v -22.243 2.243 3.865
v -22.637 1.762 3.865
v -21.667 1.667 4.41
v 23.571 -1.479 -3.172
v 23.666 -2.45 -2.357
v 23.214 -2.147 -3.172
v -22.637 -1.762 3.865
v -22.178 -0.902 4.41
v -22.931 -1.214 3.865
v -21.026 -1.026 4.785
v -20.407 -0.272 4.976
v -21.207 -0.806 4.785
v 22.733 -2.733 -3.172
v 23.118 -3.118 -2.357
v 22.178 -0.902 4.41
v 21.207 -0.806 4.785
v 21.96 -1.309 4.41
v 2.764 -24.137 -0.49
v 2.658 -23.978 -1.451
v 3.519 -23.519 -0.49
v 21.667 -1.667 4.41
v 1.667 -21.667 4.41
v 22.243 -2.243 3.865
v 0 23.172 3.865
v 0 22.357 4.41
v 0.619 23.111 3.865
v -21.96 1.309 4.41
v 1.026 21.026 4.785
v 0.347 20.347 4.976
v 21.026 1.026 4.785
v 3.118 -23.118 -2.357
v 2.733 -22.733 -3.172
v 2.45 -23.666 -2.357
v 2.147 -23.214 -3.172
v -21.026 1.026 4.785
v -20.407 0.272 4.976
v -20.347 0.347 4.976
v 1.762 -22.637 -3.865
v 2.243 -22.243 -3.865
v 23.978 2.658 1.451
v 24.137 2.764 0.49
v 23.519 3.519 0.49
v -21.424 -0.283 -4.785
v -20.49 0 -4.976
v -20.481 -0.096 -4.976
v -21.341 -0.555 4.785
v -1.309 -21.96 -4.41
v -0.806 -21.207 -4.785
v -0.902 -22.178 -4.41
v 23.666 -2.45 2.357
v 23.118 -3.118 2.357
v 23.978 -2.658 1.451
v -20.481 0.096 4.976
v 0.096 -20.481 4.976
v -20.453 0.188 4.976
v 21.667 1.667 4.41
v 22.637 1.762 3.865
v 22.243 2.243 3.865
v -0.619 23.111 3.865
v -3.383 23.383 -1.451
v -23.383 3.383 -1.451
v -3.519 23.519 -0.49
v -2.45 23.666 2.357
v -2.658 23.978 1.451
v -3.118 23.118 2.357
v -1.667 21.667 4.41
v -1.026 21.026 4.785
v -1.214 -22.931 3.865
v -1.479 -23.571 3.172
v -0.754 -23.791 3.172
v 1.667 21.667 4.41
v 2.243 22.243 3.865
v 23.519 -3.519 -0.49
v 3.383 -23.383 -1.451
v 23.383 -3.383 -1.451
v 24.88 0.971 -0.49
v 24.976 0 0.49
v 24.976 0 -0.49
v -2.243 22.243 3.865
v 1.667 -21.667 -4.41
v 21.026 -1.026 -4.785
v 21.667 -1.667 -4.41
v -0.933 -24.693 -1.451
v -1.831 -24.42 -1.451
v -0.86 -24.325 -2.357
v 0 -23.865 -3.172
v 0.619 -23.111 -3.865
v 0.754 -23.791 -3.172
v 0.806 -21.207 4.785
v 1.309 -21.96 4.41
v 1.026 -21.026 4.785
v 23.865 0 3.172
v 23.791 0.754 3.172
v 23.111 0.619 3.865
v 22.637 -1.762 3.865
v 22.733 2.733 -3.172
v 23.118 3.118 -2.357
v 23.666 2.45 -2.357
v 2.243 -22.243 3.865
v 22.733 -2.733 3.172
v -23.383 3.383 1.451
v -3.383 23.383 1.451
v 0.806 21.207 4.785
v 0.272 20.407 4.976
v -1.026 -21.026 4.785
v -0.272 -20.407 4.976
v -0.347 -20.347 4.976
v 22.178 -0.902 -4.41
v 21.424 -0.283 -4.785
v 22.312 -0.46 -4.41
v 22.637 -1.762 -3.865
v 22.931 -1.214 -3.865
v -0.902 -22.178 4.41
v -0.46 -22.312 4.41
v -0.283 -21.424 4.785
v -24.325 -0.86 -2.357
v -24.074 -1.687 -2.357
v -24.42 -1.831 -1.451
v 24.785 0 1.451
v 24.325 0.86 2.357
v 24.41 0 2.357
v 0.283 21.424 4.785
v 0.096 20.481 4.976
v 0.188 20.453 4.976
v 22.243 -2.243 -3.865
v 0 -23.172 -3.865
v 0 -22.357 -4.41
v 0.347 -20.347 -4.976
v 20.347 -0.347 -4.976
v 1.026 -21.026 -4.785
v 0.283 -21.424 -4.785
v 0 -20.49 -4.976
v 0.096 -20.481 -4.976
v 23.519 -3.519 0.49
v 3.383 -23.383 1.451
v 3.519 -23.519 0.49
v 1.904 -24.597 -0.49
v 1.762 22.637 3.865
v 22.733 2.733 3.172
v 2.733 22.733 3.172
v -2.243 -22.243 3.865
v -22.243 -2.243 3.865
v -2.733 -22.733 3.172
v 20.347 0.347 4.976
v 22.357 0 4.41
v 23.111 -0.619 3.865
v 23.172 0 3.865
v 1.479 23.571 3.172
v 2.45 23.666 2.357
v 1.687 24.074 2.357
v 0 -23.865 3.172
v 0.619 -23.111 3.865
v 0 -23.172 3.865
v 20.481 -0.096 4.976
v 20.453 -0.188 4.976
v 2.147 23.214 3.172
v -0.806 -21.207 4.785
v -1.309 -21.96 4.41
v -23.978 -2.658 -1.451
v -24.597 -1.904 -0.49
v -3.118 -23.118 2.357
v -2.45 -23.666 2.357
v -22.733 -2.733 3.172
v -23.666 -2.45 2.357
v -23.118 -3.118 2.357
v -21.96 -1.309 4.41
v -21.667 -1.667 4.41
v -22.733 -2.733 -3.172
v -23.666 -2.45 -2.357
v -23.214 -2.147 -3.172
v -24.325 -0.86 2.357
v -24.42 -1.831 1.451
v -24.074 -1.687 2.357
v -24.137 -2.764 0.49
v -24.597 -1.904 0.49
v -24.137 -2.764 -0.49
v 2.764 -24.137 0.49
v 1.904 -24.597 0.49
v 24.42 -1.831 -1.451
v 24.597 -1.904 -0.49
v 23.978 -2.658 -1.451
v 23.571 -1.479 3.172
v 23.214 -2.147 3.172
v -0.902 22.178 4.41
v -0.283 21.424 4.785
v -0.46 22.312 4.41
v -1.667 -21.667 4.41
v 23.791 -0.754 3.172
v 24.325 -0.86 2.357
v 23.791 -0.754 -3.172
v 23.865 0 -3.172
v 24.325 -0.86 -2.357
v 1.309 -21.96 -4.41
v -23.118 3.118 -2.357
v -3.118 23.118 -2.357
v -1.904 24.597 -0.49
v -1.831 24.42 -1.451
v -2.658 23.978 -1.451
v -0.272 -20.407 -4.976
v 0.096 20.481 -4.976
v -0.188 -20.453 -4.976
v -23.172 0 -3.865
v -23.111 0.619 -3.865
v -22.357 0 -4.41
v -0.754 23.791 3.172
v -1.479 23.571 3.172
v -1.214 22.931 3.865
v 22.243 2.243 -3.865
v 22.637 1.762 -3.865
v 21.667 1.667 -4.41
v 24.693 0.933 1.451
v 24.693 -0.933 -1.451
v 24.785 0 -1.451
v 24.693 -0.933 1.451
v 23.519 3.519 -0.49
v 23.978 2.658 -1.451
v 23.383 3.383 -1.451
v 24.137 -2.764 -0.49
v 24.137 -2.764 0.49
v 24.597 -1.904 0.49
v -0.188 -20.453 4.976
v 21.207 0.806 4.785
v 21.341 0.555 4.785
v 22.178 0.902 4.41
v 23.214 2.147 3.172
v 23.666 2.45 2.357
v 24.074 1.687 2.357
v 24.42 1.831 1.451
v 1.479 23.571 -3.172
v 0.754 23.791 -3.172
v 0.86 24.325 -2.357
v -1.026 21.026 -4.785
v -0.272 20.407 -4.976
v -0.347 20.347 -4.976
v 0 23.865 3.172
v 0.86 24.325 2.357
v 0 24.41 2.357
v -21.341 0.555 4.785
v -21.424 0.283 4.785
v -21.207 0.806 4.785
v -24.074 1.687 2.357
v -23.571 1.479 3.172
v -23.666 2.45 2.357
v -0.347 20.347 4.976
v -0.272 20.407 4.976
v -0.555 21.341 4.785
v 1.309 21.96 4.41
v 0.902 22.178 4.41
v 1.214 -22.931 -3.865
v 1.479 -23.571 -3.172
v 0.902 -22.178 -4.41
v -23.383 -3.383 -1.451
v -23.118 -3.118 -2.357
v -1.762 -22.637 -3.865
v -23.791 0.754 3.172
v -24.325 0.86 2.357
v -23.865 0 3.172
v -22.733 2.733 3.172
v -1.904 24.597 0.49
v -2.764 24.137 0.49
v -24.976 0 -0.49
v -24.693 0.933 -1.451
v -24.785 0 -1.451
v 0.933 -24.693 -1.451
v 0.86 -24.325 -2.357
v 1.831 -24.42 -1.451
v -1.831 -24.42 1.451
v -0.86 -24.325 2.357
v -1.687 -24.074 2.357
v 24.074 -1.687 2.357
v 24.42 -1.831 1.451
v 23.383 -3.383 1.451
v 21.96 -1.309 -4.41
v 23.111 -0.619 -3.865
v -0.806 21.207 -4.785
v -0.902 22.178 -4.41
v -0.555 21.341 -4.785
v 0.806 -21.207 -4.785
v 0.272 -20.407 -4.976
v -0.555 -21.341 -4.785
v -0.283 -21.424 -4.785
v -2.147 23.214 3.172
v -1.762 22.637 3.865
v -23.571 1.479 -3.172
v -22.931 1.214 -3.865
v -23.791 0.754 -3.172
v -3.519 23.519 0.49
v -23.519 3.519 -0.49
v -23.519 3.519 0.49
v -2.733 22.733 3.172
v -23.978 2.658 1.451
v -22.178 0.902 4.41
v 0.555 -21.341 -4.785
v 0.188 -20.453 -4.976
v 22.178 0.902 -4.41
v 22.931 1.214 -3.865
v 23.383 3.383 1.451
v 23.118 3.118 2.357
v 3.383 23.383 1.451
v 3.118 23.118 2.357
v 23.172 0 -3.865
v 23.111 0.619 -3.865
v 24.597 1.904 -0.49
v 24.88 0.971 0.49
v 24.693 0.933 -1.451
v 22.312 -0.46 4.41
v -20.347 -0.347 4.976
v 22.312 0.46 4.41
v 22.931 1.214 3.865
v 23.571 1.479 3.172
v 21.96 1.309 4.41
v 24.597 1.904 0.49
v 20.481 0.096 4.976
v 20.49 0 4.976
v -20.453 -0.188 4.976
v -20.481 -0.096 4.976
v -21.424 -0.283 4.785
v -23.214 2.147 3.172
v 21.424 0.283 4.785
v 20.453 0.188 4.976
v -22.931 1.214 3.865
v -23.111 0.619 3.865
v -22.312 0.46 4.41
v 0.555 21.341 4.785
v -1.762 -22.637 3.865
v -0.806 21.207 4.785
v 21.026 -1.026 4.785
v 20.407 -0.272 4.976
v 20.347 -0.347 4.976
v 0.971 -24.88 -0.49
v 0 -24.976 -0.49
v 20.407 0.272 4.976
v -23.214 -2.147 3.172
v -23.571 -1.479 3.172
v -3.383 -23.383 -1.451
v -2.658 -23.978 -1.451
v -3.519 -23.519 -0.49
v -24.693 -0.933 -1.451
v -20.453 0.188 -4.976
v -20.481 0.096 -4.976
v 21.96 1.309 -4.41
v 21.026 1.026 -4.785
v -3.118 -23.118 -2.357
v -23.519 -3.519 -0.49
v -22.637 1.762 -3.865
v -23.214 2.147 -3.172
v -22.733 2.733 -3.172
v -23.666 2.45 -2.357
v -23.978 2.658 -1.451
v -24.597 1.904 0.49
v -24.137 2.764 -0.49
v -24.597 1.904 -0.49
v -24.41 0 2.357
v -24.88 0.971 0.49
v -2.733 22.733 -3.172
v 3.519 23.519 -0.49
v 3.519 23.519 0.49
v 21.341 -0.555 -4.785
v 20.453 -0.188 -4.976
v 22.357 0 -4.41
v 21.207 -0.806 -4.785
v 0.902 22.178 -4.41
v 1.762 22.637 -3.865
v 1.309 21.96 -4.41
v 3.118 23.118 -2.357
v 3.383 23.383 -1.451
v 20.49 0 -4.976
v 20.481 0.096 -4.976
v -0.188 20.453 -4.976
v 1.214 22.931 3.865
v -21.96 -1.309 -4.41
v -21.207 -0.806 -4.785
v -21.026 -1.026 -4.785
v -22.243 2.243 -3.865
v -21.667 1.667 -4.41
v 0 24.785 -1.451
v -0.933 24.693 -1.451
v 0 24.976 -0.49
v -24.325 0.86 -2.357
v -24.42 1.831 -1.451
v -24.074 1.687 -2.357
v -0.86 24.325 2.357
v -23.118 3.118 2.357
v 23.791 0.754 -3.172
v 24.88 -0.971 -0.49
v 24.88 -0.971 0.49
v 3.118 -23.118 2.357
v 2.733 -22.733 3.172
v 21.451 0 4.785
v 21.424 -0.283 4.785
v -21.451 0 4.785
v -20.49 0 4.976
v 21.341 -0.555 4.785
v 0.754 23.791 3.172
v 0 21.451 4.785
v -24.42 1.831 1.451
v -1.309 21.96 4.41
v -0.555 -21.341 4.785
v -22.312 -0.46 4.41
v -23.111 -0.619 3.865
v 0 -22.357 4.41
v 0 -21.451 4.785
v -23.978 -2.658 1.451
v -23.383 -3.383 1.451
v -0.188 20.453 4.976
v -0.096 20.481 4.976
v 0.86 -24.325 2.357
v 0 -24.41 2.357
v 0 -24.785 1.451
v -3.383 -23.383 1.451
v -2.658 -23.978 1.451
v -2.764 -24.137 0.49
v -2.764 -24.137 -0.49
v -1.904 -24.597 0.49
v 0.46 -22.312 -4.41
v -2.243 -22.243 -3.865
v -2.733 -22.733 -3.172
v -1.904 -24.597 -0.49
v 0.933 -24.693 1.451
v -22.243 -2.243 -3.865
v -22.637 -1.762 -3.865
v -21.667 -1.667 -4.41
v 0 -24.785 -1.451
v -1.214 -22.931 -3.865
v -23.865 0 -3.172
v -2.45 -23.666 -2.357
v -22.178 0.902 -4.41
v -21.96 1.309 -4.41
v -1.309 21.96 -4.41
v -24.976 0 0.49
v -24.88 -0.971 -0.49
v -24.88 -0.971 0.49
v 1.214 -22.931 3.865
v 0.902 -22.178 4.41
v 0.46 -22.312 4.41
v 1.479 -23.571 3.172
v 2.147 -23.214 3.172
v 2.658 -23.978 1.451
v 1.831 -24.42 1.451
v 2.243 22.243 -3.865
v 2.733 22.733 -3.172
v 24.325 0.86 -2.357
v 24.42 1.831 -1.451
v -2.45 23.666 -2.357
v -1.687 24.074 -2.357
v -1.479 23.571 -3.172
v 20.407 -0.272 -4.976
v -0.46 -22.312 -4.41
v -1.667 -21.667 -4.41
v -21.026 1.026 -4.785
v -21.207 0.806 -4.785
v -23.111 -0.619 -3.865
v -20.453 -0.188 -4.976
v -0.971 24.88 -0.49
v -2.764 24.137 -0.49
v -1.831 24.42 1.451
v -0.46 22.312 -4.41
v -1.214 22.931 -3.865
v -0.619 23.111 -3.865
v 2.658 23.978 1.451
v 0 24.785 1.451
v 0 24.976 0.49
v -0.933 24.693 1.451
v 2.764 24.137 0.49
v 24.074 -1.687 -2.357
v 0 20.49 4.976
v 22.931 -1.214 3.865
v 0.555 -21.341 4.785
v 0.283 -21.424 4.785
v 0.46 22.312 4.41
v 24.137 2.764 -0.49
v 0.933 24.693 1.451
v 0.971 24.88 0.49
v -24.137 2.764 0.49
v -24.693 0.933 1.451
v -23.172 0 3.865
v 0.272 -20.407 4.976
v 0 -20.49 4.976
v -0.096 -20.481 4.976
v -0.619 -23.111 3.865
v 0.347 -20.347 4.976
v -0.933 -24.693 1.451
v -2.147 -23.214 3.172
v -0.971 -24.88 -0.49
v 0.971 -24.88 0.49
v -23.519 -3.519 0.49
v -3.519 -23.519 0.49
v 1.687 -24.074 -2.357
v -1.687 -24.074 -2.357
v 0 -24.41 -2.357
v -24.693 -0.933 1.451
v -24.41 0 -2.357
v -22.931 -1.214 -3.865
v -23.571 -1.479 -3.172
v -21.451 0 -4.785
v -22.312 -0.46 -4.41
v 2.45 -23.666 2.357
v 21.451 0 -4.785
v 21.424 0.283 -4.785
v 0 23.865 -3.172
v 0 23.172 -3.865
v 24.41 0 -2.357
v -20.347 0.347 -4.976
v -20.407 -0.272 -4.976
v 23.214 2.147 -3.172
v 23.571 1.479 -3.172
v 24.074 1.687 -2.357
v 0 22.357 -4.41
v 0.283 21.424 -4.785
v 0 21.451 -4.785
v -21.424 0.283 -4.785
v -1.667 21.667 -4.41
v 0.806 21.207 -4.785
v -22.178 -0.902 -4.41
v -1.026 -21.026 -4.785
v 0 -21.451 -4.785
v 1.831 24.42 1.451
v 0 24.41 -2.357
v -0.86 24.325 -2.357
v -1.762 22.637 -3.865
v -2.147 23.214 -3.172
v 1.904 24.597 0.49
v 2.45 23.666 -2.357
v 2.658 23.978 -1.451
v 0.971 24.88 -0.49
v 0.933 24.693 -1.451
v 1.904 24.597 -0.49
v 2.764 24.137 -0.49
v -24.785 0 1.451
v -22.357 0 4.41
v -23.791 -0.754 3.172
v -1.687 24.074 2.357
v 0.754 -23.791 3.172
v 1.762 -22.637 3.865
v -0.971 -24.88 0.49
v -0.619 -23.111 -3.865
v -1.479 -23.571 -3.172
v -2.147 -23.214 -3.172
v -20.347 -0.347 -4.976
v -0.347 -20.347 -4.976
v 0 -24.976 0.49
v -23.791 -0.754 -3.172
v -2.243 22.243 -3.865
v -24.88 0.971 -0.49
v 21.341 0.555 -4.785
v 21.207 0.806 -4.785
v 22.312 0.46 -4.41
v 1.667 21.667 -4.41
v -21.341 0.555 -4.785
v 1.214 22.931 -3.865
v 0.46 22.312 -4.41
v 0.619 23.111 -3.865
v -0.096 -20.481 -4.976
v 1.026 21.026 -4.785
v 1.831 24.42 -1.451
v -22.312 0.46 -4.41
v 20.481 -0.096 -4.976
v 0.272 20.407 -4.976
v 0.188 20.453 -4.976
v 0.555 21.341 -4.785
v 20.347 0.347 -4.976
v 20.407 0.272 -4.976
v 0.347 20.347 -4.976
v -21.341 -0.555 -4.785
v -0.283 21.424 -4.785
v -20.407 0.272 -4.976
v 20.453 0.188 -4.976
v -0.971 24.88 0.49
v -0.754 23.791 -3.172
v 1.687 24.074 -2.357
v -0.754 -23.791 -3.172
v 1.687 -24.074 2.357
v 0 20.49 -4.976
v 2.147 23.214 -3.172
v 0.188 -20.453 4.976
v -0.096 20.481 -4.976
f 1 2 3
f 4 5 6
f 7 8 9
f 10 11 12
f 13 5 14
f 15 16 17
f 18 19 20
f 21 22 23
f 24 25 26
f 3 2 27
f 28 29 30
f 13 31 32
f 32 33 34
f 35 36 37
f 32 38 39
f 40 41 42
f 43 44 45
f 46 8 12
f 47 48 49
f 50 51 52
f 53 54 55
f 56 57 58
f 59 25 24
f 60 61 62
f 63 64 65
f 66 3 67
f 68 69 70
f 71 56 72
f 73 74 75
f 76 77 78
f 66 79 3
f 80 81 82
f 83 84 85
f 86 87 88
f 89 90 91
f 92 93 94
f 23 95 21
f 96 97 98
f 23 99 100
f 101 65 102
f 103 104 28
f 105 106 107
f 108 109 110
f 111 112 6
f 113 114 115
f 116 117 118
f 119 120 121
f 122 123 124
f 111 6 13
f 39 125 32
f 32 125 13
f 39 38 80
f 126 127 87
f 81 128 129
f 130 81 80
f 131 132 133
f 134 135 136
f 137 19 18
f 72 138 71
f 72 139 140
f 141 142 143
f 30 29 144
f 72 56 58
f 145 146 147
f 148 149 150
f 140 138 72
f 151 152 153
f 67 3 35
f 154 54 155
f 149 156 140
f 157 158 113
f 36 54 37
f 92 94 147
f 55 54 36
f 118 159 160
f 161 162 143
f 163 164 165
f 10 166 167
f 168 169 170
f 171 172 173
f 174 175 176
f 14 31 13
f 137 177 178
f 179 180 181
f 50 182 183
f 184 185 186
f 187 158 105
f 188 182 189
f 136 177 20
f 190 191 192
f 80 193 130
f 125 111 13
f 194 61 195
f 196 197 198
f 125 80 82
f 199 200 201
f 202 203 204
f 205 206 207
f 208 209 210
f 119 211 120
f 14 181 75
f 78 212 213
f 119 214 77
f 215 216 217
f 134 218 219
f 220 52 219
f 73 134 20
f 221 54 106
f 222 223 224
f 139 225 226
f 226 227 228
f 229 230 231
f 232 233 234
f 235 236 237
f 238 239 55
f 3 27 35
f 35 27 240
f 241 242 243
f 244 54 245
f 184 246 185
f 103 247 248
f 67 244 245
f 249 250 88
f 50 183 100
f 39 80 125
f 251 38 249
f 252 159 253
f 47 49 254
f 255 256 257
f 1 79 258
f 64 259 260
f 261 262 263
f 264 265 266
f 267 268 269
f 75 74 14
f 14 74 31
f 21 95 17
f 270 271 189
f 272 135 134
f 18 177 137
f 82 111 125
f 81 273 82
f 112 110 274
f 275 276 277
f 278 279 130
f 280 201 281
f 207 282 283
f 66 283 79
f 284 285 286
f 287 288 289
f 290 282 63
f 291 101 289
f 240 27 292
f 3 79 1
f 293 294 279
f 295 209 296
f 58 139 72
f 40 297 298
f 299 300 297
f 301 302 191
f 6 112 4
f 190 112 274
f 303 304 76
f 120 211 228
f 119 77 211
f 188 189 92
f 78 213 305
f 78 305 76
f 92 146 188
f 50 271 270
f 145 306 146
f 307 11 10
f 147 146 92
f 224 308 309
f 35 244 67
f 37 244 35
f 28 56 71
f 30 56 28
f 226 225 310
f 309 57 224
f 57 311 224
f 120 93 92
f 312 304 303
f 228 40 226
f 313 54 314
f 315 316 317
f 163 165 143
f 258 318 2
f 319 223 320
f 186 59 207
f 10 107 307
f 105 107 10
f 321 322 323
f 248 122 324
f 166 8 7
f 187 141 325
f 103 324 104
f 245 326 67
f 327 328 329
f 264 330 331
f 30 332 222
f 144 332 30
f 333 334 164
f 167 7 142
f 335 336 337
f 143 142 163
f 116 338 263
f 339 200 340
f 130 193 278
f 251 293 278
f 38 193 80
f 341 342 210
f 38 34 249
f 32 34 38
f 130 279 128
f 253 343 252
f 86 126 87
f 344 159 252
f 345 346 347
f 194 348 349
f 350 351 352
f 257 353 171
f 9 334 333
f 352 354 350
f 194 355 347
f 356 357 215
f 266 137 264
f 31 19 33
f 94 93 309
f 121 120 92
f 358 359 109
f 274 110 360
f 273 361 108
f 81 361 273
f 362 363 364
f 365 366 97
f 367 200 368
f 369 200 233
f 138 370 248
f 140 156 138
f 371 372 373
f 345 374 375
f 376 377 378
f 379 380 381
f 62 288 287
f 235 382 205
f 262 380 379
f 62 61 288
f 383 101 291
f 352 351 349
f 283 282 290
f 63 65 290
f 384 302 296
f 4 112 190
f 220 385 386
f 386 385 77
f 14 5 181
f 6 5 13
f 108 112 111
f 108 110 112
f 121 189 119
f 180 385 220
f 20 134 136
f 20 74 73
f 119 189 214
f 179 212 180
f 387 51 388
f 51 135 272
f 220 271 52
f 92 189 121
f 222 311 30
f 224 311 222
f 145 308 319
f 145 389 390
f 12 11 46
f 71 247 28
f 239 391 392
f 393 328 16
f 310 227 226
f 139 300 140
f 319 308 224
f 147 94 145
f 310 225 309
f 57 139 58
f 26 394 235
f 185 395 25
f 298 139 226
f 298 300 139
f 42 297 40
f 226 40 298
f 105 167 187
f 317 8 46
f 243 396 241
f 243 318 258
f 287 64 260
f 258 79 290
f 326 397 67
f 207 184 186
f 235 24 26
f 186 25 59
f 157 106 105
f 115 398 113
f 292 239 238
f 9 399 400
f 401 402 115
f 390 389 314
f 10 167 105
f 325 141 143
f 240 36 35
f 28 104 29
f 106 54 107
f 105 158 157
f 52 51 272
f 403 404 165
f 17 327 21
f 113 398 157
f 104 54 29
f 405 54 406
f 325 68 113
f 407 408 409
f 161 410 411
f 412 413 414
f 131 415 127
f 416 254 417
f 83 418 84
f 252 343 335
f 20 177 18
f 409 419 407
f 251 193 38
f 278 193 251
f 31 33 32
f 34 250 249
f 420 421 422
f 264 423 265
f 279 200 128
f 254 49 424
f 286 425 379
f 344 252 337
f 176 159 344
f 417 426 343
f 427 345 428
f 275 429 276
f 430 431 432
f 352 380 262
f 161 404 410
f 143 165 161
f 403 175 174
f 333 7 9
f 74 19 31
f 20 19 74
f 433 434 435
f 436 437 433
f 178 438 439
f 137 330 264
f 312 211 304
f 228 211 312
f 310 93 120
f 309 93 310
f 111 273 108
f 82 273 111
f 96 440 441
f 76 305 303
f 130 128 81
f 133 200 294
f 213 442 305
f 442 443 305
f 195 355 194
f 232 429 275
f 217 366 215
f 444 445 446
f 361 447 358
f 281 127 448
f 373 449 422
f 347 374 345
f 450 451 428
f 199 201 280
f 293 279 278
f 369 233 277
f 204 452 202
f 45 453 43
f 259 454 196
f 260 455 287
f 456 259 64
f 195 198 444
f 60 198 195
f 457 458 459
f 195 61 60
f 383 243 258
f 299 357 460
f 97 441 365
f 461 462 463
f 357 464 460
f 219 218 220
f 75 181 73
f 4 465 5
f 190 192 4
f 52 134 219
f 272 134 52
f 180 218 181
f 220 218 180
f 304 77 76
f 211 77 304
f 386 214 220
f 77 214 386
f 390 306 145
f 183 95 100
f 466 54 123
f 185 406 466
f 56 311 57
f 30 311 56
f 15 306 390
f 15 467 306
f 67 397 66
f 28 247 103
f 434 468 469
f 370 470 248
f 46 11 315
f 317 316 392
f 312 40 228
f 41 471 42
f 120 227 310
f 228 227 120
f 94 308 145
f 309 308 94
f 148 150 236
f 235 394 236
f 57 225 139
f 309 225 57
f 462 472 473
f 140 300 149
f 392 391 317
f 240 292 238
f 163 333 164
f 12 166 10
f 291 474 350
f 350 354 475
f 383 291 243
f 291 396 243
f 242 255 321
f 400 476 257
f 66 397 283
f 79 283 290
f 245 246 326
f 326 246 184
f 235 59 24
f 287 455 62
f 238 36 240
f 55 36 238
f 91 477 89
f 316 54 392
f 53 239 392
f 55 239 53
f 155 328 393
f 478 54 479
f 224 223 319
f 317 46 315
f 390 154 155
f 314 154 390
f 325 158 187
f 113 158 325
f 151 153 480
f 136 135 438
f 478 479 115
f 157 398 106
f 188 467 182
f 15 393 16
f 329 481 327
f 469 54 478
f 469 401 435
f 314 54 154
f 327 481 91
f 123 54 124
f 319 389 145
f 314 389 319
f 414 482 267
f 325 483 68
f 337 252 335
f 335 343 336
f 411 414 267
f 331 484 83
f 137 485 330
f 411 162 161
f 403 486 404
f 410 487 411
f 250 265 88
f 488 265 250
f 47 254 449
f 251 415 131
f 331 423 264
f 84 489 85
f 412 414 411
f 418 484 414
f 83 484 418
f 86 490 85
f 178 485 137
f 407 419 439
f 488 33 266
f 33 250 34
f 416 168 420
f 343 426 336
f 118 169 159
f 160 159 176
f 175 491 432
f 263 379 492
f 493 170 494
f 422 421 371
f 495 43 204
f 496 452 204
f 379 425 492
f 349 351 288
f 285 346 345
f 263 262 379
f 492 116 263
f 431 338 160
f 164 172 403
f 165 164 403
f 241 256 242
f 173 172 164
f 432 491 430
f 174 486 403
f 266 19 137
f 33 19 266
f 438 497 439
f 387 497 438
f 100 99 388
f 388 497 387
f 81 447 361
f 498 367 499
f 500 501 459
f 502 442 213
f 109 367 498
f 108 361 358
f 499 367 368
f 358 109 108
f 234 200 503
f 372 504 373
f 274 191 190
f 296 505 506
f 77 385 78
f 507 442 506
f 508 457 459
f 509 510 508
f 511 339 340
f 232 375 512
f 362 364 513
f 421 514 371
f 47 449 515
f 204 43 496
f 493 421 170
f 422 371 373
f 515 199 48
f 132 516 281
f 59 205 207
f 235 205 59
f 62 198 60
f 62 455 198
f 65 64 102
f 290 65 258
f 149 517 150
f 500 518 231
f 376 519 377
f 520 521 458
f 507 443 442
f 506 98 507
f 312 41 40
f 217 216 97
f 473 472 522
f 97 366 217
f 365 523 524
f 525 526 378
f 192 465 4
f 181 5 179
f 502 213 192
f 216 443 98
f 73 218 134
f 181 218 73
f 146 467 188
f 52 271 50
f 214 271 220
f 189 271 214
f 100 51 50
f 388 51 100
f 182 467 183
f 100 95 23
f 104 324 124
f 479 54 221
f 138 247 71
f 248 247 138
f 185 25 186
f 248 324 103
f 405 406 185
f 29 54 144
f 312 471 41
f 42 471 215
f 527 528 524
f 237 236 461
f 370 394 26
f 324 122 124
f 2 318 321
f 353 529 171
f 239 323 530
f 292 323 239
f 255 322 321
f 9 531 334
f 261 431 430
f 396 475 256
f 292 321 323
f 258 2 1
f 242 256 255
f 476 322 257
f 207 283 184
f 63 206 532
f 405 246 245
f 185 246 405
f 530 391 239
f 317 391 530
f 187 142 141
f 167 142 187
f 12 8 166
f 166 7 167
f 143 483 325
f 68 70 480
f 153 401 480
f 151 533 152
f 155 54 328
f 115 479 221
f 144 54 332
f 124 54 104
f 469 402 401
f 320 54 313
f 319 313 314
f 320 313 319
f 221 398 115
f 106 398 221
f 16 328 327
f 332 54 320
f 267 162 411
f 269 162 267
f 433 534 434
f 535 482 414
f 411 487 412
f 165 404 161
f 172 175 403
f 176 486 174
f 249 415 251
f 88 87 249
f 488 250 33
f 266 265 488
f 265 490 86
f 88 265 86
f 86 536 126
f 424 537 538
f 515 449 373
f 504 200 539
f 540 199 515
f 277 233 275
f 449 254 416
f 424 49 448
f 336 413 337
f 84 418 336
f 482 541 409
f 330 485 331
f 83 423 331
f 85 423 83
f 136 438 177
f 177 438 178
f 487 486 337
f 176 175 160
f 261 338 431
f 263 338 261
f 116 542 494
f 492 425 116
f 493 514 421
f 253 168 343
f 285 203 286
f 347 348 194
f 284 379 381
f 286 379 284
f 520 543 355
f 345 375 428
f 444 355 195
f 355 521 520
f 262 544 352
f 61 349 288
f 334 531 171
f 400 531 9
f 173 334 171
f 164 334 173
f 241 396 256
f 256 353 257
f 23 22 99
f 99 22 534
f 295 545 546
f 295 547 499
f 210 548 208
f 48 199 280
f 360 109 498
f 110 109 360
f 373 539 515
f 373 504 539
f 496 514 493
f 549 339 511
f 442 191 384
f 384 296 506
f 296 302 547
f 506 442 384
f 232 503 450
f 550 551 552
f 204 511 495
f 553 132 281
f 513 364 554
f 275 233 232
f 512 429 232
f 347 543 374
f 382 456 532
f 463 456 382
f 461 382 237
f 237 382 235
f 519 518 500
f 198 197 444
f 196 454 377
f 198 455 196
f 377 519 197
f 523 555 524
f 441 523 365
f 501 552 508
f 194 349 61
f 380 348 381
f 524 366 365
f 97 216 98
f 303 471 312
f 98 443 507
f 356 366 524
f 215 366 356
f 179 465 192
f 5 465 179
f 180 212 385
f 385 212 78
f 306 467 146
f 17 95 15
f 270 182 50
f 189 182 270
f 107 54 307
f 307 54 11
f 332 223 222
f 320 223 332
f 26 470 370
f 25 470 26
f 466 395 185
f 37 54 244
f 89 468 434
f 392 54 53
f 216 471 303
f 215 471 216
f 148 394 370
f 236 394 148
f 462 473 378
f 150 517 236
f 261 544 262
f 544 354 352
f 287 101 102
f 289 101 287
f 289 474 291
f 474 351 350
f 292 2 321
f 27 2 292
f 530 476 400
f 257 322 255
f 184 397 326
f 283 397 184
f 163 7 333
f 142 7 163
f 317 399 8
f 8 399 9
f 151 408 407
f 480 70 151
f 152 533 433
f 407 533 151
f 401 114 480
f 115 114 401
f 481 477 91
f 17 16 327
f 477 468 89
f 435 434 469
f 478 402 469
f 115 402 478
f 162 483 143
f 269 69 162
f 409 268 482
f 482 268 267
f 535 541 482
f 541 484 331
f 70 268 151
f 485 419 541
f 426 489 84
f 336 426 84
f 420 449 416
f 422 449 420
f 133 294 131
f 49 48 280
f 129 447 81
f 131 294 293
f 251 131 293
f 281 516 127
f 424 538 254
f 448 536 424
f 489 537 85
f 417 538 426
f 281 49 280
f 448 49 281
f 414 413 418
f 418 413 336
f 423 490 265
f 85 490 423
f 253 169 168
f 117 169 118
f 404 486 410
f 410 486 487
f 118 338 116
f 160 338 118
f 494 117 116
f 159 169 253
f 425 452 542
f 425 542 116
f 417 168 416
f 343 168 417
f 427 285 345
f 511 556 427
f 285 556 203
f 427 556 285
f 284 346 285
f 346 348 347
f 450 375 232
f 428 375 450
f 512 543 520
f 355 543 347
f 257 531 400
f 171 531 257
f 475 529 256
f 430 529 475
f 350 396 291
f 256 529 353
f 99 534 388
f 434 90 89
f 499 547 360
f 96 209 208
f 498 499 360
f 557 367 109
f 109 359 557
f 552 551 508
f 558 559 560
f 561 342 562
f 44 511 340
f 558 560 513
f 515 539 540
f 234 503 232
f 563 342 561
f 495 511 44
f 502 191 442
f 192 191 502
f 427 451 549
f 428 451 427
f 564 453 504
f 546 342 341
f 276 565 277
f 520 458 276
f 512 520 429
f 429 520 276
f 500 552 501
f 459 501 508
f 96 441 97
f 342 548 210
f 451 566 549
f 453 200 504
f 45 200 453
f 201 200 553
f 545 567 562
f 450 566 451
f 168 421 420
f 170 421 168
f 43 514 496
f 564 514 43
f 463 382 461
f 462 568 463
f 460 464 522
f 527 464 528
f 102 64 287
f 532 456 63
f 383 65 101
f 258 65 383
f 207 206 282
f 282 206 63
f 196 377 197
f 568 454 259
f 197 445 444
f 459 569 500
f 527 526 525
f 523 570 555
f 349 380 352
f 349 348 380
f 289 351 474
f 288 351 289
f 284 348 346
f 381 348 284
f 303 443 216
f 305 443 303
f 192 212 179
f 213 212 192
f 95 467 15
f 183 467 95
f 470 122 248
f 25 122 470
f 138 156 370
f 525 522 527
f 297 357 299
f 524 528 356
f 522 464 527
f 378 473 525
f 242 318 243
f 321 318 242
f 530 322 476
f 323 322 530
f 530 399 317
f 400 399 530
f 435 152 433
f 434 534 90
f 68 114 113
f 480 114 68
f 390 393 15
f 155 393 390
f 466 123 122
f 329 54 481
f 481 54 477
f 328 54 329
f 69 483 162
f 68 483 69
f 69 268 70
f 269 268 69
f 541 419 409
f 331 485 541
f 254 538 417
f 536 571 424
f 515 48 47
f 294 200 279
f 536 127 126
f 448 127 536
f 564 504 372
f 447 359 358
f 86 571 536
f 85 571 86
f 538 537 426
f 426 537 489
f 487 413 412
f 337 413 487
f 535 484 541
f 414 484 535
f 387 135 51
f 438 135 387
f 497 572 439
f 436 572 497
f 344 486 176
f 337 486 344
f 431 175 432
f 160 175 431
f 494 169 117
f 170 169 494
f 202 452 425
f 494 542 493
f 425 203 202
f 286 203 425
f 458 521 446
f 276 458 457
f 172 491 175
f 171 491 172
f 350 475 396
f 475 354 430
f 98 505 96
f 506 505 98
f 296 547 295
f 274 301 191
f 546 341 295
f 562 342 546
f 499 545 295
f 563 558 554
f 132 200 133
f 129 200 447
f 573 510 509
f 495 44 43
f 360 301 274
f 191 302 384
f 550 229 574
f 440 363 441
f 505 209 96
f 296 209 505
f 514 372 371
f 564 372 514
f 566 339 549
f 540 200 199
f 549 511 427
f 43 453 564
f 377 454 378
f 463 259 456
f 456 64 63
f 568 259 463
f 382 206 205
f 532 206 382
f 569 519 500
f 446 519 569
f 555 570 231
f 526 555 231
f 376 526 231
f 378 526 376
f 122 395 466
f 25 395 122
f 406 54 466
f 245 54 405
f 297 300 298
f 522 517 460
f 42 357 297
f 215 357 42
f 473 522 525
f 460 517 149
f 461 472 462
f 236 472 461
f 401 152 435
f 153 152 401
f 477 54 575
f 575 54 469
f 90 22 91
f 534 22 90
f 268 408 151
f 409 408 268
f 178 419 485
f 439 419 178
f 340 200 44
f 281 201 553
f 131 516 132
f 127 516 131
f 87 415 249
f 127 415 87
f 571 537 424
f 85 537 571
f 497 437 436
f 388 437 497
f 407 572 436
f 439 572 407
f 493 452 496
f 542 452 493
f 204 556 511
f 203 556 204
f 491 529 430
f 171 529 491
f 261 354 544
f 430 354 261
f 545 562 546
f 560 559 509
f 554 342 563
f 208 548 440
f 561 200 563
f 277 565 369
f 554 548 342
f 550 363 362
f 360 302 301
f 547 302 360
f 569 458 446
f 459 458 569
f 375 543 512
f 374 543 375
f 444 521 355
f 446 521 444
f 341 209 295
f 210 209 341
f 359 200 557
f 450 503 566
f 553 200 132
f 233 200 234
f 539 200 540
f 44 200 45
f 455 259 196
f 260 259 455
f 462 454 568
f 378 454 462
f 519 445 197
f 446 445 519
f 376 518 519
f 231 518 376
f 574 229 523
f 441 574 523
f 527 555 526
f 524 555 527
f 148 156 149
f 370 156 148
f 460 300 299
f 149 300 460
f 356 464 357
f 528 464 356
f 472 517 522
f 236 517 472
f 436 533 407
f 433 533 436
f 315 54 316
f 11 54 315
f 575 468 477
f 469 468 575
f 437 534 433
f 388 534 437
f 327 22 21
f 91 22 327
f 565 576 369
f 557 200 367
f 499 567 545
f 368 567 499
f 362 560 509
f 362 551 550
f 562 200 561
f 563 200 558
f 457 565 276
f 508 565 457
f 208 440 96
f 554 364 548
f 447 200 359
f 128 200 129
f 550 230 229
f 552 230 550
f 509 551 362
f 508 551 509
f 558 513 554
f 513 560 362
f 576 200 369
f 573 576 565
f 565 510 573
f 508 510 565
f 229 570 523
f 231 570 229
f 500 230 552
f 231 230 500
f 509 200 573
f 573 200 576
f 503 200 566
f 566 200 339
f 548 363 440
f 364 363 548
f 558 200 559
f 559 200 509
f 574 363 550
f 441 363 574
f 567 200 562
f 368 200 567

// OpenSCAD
// Benchmark: Hull Operations
// Purpose: Tests hull() which creates convex hulls
// Expected: Moderate improvement with Manifold

/* [Parameters] */
sphere_count = 4; // [3:8]
spread = 20; // [10:40]
sphere_size = 5; // [3:10]
$fn = 32; // [16:64]

/* [Hidden] */
hull() {
    for (i = [0:sphere_count-1]) {
        angle = i * 360 / sphere_count;
        translate([
            cos(angle) * spread,
            sin(angle) * spread,
            sin(angle * 2) * spread/2
        ])
        sphere(r=sphere_size);
    }
}
